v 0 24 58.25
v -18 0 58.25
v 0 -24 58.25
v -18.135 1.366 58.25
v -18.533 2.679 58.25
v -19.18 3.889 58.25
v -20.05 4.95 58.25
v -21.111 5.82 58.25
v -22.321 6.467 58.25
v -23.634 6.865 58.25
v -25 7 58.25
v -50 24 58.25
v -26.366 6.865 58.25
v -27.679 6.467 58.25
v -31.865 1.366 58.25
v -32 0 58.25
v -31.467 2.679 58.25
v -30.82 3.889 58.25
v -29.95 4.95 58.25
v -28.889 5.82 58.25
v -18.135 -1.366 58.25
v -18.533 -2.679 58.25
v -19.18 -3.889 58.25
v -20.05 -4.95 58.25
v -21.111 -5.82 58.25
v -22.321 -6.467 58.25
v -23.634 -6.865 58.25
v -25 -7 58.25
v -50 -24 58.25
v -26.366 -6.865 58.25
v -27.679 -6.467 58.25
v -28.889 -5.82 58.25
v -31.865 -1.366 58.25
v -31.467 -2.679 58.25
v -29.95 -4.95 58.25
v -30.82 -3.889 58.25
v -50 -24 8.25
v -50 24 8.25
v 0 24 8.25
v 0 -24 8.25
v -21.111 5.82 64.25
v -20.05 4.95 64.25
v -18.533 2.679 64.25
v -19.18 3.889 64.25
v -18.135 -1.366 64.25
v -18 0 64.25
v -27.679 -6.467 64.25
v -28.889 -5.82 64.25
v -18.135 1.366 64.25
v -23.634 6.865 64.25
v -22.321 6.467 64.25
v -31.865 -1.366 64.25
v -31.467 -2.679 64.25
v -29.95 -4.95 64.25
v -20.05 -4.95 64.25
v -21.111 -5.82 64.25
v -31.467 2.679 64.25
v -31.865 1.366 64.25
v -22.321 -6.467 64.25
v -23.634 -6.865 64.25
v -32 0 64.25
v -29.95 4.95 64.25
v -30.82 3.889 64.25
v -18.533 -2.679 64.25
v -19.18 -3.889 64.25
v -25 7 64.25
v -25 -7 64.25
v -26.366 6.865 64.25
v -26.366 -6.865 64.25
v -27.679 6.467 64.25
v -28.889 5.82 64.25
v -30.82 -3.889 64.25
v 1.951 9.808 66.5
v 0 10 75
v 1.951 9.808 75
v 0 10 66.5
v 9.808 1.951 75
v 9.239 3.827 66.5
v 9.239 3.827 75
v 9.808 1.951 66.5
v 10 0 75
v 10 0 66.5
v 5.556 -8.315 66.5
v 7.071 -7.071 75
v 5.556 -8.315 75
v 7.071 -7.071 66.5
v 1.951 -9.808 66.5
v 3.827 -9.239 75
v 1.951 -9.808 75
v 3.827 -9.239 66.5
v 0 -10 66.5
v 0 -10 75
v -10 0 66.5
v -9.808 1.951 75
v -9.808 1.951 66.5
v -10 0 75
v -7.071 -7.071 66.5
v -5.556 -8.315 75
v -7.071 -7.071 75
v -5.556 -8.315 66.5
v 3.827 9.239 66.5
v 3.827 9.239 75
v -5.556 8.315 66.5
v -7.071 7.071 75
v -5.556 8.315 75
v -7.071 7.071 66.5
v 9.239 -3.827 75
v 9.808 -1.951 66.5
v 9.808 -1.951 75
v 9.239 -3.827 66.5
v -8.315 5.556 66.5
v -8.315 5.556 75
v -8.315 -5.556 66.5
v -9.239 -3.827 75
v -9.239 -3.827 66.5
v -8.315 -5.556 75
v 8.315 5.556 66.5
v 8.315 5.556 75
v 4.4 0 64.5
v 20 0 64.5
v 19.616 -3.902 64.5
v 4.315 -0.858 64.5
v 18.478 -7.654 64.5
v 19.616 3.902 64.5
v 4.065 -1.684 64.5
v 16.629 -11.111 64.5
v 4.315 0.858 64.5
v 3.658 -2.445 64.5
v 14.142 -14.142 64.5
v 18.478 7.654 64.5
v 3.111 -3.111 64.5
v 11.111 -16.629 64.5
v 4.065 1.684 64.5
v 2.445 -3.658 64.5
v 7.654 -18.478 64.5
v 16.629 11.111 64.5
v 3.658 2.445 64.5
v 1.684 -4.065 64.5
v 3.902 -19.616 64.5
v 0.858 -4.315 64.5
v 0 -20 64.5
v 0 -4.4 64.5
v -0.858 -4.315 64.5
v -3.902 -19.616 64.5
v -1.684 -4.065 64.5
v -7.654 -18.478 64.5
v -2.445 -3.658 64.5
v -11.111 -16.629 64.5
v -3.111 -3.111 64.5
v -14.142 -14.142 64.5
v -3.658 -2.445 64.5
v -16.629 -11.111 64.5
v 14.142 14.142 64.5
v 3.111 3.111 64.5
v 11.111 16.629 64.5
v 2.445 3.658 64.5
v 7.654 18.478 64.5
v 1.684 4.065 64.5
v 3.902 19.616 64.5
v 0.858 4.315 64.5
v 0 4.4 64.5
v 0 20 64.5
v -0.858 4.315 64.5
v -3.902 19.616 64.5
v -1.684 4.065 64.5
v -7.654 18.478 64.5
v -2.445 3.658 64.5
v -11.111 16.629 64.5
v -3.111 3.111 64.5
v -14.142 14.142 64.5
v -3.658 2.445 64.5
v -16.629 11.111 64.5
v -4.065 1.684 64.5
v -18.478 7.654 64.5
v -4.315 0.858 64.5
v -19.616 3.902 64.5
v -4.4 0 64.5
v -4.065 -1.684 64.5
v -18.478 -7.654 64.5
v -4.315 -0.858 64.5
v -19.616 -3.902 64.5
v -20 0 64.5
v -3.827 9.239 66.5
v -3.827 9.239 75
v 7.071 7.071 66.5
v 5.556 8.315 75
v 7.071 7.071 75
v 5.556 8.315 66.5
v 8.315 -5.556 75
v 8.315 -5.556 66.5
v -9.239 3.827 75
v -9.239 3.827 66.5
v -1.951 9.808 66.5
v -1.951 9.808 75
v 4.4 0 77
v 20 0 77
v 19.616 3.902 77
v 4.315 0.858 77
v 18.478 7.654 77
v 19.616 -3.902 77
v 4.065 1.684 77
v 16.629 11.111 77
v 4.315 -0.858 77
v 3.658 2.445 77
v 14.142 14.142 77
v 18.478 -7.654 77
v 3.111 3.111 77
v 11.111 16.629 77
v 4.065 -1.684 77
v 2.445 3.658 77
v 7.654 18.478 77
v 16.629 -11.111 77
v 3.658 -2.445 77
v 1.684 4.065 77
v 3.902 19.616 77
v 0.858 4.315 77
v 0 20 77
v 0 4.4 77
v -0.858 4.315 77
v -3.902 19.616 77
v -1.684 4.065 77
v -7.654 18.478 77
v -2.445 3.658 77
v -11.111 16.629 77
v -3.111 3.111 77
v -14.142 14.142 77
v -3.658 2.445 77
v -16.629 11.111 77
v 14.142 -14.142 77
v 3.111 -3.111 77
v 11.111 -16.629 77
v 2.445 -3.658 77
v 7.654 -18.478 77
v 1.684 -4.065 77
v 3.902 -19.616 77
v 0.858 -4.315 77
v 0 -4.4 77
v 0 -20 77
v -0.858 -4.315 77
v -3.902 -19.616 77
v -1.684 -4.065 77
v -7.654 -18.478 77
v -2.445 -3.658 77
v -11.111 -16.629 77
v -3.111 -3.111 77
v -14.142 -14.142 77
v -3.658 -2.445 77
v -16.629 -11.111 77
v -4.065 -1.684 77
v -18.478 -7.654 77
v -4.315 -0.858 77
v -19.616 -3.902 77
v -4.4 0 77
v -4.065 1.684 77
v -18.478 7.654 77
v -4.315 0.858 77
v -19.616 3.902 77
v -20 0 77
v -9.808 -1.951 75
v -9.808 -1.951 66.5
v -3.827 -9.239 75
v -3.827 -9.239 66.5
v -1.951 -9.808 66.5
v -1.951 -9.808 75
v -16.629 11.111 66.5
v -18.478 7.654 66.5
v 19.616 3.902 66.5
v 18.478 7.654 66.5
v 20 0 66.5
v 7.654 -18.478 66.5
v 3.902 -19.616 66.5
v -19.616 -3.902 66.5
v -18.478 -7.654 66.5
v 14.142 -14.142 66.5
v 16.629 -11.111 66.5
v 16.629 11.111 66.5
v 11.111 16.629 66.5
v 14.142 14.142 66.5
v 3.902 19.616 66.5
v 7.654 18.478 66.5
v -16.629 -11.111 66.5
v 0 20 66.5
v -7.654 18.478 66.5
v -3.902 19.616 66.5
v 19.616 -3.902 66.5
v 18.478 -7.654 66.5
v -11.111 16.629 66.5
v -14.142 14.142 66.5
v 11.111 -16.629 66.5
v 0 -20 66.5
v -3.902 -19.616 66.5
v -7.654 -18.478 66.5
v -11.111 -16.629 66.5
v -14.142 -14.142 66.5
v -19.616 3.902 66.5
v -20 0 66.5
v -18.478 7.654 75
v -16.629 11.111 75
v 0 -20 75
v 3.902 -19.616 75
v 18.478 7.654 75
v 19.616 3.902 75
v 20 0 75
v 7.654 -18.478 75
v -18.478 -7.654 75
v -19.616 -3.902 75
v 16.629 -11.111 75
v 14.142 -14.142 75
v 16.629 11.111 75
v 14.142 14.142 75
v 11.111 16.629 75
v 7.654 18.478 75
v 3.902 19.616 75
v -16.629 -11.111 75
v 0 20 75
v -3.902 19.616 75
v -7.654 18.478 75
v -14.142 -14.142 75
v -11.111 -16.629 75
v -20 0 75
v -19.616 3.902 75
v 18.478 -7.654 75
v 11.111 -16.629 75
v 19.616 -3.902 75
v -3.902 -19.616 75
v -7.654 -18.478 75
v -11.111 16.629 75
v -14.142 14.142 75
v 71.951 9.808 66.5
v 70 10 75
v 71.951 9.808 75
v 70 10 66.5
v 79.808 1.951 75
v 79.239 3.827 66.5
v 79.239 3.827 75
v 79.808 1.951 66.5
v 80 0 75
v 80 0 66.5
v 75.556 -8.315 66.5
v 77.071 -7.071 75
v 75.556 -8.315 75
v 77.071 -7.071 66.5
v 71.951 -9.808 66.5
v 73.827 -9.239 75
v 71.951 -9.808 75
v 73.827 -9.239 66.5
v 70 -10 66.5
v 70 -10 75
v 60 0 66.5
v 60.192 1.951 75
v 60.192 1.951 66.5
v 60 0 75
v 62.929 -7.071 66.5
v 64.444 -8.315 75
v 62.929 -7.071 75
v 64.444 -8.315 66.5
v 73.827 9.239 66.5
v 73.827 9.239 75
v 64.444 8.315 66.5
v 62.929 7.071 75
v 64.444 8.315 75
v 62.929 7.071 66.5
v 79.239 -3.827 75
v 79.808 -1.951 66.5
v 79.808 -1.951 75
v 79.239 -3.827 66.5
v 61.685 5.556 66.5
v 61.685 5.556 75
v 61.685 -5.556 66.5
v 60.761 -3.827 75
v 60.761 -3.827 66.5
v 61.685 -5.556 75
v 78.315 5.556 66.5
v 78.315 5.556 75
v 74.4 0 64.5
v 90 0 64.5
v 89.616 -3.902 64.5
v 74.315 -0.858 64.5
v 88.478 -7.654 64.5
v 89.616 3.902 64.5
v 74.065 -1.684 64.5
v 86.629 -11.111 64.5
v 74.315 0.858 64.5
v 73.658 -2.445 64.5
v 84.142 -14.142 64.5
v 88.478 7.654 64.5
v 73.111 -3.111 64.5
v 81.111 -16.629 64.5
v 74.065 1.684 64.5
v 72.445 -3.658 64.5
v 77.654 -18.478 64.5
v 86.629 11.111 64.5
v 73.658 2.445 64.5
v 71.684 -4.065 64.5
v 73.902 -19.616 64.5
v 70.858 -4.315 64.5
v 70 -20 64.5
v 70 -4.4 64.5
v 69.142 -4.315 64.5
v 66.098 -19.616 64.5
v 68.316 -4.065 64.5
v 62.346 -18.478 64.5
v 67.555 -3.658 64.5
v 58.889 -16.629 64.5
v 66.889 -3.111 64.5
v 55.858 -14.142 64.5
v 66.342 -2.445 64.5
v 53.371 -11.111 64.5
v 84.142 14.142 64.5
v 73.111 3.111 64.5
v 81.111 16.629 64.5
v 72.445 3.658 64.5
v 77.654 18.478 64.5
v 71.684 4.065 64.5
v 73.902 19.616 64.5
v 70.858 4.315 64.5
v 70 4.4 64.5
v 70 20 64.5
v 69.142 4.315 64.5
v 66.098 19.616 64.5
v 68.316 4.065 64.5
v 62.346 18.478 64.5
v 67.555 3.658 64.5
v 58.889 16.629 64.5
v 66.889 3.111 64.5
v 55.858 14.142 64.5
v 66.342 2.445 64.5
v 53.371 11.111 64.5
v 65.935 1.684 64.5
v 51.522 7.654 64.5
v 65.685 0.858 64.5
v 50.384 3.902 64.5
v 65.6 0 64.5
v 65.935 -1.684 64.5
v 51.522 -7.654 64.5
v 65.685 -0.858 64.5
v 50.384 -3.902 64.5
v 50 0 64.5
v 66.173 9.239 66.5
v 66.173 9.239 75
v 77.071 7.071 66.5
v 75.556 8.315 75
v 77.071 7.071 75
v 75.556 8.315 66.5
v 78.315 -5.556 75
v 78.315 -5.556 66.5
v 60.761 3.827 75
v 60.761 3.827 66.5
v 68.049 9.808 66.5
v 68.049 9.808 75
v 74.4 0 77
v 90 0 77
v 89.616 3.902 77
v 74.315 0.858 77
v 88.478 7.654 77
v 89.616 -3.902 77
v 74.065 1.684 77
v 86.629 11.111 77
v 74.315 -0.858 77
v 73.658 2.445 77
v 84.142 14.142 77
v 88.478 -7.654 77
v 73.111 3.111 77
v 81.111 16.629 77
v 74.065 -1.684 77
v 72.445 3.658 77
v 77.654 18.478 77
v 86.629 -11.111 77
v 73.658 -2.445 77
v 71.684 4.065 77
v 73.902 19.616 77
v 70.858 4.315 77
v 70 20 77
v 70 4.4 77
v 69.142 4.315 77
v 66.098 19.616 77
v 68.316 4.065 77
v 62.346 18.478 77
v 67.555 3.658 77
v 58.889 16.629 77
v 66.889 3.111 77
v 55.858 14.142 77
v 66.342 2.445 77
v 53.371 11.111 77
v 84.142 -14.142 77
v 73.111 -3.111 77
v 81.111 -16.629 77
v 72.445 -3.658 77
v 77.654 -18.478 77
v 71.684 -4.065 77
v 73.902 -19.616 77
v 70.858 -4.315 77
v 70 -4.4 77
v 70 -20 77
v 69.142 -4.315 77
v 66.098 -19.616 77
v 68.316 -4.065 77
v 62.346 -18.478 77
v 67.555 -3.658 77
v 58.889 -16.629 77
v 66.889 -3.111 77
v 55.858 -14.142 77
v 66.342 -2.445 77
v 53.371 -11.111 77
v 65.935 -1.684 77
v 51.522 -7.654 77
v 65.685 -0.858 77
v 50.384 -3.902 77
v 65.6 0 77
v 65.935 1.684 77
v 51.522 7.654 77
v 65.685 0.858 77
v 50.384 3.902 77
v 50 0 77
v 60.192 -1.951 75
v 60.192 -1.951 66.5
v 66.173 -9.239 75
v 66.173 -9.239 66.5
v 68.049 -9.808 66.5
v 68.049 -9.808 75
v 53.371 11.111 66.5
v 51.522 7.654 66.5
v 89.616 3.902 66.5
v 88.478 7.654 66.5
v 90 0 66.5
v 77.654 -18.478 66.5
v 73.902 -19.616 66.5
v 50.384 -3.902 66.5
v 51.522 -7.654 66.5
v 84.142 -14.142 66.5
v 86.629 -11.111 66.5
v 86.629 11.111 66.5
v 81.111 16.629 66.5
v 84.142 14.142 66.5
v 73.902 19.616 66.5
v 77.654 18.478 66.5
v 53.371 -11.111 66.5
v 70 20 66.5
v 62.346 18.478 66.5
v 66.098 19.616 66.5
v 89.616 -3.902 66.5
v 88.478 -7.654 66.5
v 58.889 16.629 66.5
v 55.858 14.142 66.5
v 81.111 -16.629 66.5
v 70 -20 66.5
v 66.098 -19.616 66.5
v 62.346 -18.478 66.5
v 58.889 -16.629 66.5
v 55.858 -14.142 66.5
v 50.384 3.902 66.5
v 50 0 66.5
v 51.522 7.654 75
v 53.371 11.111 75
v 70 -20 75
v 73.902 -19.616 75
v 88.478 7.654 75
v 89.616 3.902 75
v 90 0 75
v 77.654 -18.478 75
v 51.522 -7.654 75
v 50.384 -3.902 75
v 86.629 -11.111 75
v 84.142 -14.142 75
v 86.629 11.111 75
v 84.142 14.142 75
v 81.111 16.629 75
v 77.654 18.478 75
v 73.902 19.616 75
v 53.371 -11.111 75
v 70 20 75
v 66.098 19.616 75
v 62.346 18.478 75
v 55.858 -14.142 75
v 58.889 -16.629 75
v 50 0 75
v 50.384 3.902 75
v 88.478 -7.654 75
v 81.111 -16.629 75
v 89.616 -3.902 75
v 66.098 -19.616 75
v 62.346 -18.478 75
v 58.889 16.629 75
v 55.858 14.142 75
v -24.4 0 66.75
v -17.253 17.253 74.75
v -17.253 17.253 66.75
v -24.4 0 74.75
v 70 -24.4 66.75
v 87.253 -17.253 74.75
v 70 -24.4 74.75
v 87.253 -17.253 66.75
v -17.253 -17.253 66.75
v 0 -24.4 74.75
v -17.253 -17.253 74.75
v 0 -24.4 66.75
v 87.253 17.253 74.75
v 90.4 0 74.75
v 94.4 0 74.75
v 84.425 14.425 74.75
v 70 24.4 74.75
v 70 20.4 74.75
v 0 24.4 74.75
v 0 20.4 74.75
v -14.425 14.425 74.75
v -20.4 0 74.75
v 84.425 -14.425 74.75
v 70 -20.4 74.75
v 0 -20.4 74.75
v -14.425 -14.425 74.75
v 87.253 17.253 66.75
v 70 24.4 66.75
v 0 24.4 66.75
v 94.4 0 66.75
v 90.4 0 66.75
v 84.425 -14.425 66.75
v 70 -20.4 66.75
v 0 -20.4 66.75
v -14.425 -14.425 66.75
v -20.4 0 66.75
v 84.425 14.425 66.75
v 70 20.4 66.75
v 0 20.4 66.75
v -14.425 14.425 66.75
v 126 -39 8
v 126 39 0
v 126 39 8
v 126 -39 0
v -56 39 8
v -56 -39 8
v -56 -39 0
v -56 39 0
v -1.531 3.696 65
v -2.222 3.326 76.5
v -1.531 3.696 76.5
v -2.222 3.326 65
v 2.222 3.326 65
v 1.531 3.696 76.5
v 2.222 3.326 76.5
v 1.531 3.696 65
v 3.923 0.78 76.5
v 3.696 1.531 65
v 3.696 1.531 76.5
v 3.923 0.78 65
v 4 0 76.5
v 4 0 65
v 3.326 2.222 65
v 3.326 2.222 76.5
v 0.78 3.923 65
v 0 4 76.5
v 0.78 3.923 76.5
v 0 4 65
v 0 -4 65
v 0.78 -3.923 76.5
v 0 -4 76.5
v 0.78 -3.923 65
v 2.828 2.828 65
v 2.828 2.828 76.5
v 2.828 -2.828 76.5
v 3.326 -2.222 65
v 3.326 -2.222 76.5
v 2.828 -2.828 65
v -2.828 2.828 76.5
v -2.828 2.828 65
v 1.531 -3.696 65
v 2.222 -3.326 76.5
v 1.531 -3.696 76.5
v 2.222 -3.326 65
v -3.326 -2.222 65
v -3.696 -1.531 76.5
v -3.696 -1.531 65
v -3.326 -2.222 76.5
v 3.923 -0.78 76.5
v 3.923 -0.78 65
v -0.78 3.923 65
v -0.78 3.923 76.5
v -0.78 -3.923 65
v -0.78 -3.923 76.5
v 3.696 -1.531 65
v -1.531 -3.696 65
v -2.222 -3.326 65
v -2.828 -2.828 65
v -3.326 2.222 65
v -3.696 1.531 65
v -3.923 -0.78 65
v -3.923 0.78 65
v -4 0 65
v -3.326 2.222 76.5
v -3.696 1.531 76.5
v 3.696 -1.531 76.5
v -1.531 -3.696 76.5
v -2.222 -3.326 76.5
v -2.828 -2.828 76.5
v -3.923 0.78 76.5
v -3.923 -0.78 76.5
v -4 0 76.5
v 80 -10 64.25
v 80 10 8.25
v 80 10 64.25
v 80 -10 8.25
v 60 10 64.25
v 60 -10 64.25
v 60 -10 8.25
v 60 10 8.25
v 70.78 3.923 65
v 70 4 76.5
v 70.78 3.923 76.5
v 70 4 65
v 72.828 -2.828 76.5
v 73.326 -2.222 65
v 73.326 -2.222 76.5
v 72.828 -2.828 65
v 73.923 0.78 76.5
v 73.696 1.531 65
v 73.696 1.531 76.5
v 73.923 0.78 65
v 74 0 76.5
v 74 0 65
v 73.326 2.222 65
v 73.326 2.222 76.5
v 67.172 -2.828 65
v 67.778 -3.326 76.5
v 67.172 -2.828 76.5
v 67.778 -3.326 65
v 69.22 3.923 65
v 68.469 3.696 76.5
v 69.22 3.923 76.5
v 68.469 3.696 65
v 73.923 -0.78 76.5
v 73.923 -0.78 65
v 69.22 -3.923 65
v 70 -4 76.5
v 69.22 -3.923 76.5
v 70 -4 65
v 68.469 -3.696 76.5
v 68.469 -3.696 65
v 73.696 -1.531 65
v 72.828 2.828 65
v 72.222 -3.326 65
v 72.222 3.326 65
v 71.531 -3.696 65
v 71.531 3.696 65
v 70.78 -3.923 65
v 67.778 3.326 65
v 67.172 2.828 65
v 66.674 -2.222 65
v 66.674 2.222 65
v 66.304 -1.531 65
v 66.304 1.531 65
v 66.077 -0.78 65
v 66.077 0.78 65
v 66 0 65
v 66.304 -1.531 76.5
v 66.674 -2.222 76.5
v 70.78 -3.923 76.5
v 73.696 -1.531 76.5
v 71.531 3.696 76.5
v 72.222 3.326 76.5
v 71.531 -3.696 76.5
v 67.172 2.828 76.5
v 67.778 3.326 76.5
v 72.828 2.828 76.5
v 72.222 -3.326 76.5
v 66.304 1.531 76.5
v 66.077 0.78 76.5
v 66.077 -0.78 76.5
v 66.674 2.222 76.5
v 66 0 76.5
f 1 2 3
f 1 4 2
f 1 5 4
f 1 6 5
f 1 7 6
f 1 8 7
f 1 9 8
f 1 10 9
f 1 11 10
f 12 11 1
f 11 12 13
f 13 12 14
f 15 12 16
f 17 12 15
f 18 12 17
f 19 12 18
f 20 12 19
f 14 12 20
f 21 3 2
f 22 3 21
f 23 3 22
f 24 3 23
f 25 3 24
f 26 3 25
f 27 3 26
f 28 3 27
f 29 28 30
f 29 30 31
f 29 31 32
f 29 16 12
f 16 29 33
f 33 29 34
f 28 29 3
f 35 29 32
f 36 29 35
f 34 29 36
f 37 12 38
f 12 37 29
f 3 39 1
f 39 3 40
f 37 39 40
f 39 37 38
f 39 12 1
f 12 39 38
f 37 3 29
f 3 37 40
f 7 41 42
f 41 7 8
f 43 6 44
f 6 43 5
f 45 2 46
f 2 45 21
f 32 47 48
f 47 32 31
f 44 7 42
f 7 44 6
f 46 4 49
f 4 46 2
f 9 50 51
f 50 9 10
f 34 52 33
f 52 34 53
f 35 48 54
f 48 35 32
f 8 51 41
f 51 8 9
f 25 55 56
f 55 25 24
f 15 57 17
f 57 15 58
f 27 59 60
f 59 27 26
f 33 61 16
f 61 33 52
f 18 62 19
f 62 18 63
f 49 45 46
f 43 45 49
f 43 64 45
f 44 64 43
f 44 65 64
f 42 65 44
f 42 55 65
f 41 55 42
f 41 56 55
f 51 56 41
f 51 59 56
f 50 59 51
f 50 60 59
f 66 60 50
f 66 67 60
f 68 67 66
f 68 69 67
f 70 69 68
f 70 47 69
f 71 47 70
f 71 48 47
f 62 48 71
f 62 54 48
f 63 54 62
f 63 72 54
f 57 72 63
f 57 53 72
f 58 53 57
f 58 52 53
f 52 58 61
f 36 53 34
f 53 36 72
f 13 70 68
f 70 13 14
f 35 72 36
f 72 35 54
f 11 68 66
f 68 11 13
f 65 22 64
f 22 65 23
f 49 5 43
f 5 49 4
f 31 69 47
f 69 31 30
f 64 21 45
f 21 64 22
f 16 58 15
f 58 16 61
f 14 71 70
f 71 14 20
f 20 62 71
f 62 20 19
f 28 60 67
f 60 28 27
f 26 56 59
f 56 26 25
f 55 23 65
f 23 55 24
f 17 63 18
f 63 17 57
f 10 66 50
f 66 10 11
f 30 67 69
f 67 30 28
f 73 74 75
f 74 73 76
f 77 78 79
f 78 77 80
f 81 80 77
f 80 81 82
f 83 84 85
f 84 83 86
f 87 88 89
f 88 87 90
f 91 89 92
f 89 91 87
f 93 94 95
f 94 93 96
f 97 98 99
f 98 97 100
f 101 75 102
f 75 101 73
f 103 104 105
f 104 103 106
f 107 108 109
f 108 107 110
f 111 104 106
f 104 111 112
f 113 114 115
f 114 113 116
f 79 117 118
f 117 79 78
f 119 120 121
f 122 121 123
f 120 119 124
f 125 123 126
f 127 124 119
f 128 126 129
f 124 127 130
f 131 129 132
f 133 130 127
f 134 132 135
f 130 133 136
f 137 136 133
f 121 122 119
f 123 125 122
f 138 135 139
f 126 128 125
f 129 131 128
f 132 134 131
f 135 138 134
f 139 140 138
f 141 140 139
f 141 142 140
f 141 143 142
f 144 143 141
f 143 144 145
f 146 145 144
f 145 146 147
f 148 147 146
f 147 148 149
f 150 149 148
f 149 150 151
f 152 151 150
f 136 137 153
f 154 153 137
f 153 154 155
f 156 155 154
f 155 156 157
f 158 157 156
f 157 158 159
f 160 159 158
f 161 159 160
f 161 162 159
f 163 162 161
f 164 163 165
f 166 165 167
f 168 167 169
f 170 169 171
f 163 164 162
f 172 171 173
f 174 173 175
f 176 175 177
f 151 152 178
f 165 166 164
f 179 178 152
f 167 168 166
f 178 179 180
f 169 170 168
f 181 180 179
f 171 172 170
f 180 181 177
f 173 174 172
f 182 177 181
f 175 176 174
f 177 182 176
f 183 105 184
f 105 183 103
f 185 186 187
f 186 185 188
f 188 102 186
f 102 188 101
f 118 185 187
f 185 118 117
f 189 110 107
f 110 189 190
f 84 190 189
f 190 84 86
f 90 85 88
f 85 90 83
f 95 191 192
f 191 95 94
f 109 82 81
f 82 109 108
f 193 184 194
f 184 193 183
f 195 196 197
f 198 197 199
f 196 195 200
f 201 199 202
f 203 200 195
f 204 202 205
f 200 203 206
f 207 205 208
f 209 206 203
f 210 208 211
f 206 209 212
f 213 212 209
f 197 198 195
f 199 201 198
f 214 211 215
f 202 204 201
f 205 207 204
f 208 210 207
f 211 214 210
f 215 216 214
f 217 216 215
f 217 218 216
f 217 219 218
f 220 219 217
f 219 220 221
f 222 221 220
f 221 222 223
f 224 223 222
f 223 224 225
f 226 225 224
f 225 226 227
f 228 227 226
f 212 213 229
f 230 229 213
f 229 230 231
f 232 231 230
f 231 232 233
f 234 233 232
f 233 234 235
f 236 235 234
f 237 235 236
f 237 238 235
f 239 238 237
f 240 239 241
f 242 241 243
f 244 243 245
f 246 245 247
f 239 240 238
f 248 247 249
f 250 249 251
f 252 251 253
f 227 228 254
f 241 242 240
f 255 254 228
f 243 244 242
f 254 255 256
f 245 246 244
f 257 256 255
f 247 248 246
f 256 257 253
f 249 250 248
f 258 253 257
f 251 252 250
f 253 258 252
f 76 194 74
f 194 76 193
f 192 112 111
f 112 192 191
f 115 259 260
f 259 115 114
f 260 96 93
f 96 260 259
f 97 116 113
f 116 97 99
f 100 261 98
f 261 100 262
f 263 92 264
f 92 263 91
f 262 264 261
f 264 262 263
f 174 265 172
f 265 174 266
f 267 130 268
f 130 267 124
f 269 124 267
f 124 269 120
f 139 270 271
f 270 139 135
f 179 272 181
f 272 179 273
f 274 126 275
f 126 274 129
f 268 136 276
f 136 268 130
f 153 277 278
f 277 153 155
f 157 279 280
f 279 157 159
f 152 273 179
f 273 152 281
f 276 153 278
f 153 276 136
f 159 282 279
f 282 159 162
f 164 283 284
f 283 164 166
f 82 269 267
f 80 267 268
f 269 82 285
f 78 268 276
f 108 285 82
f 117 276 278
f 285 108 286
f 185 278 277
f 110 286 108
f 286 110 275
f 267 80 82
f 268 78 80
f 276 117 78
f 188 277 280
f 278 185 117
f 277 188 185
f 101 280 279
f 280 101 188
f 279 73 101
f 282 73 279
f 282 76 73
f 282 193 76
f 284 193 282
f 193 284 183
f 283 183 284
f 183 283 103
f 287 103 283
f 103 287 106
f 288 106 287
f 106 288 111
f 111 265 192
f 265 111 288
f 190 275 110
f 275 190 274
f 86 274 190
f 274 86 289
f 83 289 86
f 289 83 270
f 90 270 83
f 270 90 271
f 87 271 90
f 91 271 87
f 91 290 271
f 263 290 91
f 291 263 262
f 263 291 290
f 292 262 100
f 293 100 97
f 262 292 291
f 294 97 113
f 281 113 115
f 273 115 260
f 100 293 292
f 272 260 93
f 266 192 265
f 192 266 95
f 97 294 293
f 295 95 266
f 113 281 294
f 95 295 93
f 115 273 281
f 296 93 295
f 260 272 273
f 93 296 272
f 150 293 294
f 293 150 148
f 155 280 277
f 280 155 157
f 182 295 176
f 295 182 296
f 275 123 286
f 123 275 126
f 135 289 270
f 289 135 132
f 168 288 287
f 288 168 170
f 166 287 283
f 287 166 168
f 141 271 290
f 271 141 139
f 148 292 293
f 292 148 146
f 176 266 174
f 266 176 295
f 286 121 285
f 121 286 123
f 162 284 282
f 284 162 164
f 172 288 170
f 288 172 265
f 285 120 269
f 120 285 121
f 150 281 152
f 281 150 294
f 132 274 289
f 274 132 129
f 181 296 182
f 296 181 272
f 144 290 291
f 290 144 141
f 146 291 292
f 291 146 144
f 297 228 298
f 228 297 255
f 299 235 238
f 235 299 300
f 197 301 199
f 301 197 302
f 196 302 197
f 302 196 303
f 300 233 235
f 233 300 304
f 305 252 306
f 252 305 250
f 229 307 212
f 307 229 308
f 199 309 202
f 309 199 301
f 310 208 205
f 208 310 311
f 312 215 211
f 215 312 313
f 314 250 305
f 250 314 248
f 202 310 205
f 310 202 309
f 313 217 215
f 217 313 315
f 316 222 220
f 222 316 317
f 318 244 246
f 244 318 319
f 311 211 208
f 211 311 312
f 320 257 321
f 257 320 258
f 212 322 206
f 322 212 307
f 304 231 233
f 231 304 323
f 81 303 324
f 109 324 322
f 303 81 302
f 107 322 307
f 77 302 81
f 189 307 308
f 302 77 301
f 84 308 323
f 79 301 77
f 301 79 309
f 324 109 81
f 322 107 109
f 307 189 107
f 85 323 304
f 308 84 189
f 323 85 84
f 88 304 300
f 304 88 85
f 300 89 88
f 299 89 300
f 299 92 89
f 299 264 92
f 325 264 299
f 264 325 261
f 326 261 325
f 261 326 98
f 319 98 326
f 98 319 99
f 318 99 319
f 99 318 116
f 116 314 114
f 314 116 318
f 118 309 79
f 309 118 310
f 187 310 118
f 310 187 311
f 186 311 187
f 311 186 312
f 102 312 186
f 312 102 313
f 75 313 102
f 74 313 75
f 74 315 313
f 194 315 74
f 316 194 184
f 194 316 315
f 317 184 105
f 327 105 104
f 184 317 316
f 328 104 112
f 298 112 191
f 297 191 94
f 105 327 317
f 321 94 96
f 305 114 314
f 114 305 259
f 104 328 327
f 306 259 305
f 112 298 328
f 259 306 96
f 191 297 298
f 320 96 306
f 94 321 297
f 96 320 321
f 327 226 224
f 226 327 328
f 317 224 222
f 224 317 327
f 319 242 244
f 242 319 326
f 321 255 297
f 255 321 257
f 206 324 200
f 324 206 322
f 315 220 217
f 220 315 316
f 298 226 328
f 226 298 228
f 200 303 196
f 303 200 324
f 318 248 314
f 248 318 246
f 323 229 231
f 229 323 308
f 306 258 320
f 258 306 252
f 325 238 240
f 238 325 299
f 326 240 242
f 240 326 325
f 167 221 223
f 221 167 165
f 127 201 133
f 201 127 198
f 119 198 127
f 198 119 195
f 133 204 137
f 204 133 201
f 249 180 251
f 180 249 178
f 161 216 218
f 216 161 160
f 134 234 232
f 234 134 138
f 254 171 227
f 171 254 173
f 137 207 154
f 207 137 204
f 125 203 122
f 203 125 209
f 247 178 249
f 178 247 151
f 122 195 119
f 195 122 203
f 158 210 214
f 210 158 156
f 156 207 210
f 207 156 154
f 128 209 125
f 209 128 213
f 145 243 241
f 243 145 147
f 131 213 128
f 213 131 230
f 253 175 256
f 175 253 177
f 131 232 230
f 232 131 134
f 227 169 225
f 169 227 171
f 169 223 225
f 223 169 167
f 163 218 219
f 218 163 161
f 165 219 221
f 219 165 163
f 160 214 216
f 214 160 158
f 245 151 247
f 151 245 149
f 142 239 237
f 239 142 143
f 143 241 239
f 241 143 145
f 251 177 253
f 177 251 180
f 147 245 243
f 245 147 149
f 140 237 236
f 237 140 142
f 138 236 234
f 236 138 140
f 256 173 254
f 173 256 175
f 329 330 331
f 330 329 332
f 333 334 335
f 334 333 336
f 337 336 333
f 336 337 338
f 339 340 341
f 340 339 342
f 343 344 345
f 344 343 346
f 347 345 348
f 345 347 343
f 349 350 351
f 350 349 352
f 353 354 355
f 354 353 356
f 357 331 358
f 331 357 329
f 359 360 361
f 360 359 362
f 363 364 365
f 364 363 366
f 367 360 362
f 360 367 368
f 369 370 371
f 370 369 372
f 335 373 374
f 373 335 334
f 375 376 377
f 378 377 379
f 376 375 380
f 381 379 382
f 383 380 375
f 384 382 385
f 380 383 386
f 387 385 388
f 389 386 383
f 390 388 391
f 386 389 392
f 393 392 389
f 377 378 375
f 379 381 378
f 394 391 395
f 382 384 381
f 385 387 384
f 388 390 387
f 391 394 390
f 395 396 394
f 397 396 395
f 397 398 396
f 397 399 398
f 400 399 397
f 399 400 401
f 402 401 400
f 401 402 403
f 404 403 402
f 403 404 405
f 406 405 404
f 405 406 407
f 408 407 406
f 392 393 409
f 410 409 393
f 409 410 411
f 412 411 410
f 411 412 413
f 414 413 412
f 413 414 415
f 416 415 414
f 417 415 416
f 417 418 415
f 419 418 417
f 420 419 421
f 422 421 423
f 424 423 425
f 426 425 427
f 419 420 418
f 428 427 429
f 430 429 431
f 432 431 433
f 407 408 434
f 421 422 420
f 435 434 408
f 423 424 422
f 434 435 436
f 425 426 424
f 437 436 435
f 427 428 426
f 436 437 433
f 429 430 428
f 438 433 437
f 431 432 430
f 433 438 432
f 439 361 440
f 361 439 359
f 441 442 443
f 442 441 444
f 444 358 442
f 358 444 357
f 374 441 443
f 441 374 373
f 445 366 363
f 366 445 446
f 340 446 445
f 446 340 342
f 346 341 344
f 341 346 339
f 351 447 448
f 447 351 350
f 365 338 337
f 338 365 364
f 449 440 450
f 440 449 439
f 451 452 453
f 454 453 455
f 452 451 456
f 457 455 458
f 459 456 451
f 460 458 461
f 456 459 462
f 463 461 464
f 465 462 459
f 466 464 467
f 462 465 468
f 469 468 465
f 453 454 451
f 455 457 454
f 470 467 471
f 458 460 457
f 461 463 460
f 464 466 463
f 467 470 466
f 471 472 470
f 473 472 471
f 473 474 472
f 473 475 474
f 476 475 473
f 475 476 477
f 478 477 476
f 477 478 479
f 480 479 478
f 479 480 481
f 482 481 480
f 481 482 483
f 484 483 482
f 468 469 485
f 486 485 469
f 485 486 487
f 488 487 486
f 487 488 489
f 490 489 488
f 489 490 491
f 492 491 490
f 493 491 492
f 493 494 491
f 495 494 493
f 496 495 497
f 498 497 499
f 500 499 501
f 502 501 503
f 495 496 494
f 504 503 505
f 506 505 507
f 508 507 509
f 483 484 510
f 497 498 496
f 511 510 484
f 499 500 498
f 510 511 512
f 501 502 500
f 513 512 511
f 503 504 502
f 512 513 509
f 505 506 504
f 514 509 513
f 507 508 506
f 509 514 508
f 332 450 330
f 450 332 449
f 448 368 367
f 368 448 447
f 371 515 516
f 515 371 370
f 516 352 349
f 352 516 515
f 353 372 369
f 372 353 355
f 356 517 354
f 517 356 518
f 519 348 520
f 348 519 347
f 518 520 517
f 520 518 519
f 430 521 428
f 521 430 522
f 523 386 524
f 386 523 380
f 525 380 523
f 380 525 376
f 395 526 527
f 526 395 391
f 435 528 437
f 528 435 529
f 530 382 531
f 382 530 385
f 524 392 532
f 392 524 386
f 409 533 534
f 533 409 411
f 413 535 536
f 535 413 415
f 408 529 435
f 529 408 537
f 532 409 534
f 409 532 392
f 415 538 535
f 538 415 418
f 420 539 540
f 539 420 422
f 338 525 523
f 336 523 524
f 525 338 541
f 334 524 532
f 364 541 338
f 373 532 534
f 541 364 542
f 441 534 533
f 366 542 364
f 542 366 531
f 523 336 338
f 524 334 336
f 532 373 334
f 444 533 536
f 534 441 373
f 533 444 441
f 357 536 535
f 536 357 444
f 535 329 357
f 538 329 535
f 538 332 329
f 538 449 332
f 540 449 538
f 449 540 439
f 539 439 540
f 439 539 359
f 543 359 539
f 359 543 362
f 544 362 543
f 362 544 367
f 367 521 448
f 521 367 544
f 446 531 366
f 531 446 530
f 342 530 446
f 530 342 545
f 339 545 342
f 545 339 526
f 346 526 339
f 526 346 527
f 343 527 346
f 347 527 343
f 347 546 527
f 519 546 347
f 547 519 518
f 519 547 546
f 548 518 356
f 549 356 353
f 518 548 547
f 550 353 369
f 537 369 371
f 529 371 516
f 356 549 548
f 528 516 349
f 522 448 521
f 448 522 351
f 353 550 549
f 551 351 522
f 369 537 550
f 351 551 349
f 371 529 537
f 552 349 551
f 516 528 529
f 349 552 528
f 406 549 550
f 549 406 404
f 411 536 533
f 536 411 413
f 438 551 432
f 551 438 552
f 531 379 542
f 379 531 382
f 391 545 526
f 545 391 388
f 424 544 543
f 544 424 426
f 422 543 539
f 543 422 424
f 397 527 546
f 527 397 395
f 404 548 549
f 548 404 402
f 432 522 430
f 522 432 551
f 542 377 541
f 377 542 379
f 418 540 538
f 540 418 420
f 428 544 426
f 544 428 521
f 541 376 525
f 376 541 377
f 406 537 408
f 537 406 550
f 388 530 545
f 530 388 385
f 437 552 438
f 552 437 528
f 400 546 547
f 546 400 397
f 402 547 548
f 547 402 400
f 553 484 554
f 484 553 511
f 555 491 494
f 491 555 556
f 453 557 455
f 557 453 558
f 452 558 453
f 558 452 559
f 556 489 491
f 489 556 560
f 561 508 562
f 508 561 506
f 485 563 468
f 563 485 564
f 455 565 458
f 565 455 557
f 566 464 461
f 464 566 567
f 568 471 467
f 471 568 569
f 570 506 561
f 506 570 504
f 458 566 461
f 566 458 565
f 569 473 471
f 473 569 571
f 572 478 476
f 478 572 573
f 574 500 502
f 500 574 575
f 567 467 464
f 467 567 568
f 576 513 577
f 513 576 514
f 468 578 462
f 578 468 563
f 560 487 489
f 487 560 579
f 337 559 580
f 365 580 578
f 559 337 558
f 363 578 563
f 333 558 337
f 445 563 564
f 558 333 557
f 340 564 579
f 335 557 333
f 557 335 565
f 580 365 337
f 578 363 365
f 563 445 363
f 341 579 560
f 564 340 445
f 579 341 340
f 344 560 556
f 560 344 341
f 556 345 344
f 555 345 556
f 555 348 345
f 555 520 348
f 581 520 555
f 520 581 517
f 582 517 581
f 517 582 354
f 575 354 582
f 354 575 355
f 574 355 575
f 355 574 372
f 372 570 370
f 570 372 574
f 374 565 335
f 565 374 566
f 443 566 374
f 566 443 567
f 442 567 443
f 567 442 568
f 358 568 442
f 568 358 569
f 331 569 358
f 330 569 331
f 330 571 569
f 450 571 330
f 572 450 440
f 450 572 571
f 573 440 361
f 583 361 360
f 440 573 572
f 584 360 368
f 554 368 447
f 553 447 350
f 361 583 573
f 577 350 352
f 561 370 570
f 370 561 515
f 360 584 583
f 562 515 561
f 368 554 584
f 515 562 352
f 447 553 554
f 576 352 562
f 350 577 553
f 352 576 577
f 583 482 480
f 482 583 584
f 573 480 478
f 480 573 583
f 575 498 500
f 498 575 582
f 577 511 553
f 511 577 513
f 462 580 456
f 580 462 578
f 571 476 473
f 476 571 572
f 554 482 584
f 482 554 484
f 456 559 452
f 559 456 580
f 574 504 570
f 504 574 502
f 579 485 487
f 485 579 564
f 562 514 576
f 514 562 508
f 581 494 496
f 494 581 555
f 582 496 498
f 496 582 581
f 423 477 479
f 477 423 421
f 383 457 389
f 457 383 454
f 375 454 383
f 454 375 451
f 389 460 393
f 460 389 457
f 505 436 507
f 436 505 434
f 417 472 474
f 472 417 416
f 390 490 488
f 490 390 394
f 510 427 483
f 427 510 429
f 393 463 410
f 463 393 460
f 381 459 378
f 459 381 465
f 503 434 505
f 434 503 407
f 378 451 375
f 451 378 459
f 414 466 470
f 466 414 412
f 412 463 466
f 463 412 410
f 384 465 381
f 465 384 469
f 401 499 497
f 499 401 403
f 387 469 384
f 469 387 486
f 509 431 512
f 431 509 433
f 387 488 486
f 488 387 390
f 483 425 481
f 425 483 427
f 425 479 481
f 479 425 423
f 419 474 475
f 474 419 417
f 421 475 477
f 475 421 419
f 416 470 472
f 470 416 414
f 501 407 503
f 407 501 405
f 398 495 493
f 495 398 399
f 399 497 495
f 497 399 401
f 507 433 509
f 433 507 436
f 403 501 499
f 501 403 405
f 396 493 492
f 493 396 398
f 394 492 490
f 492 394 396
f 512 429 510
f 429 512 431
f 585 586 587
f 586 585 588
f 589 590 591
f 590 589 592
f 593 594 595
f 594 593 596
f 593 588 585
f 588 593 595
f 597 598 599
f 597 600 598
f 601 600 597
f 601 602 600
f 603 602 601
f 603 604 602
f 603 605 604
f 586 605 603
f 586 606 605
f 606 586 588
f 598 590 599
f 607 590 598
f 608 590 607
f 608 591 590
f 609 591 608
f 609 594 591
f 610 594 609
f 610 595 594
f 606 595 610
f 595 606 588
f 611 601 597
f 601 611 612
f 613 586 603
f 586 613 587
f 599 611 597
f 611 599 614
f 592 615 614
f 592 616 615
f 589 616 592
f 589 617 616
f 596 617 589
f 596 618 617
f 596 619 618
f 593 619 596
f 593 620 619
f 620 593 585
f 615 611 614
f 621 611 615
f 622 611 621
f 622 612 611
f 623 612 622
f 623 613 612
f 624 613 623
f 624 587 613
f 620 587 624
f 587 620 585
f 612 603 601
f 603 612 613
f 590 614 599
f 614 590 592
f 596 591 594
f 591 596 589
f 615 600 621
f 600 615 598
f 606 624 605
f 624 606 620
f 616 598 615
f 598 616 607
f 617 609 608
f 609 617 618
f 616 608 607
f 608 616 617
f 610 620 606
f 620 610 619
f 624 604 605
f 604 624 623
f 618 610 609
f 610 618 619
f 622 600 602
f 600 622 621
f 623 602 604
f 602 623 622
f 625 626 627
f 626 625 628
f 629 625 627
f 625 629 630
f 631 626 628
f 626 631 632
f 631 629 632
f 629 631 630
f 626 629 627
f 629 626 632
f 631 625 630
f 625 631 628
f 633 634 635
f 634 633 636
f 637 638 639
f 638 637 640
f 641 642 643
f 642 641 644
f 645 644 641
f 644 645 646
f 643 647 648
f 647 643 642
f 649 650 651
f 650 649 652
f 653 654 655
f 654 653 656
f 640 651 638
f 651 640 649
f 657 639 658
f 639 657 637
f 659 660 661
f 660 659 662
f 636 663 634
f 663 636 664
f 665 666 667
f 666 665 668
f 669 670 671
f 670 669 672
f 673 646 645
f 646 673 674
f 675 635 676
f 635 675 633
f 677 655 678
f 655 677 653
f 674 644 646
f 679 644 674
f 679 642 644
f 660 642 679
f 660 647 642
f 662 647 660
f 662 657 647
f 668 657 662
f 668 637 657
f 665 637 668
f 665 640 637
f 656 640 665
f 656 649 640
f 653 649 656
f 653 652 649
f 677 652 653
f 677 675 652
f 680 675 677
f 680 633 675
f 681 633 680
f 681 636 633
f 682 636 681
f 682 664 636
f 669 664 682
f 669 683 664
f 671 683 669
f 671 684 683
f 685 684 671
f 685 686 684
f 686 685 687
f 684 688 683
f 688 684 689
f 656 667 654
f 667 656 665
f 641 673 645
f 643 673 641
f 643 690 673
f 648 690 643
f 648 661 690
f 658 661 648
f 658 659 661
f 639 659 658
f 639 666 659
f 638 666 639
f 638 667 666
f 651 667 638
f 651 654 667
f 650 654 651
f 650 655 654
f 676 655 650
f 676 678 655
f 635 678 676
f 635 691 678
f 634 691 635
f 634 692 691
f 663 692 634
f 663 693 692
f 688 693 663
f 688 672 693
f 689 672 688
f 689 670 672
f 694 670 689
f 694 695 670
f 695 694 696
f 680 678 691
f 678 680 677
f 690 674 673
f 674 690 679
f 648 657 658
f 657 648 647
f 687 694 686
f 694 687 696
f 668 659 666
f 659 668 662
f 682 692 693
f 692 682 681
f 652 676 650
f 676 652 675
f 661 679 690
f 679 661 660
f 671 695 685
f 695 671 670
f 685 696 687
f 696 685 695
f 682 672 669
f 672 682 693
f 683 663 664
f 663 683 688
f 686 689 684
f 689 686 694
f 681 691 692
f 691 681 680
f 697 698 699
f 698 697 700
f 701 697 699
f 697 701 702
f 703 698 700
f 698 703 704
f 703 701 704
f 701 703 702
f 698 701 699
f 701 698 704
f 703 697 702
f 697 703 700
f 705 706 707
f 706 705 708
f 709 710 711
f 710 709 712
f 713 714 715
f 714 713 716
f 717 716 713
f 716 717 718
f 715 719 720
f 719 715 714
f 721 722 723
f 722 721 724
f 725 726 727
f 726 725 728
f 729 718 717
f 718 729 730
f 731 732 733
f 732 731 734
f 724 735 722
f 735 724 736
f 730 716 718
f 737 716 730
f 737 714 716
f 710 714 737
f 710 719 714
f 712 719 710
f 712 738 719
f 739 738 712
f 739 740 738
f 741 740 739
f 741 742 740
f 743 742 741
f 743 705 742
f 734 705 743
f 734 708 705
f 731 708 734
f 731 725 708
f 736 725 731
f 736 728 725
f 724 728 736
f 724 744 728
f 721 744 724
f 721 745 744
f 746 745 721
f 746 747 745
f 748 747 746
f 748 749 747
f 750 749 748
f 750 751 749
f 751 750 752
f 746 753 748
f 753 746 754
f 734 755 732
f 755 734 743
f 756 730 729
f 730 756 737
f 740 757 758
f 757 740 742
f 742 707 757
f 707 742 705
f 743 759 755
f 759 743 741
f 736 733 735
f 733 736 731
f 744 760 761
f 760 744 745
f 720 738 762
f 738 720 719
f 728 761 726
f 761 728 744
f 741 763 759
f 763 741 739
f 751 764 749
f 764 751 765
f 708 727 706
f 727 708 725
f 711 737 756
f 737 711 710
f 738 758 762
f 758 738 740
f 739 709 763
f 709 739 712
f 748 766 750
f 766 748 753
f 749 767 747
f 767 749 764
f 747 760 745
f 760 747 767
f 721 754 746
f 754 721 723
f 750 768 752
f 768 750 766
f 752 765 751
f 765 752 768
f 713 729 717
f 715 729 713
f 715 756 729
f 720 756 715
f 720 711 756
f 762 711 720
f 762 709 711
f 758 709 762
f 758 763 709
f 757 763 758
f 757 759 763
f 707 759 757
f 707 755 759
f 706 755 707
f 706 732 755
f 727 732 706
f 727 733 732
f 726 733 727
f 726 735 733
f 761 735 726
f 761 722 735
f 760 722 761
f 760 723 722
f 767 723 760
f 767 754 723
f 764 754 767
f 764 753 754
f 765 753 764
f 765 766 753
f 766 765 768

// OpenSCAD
$fn = 32;

// ------------------------------------------------------------------------
// Motor belt drive: span 70 mm, pulleys d40, belt 8 mm wide
// Every part is its own module, assembly() places every instance.
// ------------------------------------------------------------------------

// --- part 1 ---
module base_plate() {
  difference() {
    translate([-91, -39, 0]) cube([182, 78, 8]);
  }
}

// --- part 2 ---
module motor() {
  union() {
    translate([-25, -24, 0]) cube([50, 48, 50]);
    translate([28, 0, 25]) rotate([0, 90, 0]) cylinder(h = 6, d = 14, center = true);
  }
}

// --- part 3 ---
module drive_shaft() {
  translate([0, 0, -5.75]) cylinder(h = 11.5, d = 8);
}

// --- part 4 ---
module pulley_drive() {
  difference() {
    union() {
      cylinder(h = 12.5, d = 20);
      cylinder(h = 2, d = 40);
      translate([0, 0, 10.5]) cylinder(h = 2, d = 40);
    }
    translate([0, 0, -1]) cylinder(h = 14.5, d = 8.8);
  }
}

// --- part 5 ---
module idler_post() {
  translate([-10, -10, 0]) cube([20, 20, 56]);
}

// --- part 6 ---
module driven_shaft() {
  translate([0, 0, -5.75]) cylinder(h = 11.5, d = 8);
}

// --- part 7 ---
module pulley_driven() {
  difference() {
    union() {
      cylinder(h = 12.5, d = 20);
      cylinder(h = 2, d = 40);
      translate([0, 0, 10.5]) cylinder(h = 2, d = 40);
    }
    translate([0, 0, -1]) cylinder(h = 14.5, d = 8.8);
  }
}

// --- part 8 ---
module drive_belt() {
  difference() {
    linear_extrude(height = 8) polygon(points = concat([for (a = [90 : 45 : 270]) [24.4 * cos(a), 24.4 * sin(a)]], [for (a = [270 : 45 : 450]) [70 + 24.4 * cos(a), 24.4 * sin(a)]]));
    translate([0, 0, -1]) linear_extrude(height = 10) polygon(points = concat([for (a = [90 : 45 : 270]) [20.4 * cos(a), 20.4 * sin(a)]], [for (a = [270 : 45 : 450]) [70 + 20.4 * cos(a), 20.4 * sin(a)]]));
  }
}

// --- assembly ---
module assembly() {
  color([0.80, 0.24, 0.20]) translate([35, 0, 0]) rotate([0, 0, 0]) base_plate();
  color([0.20, 0.45, 0.75]) translate([0, 0, 33.25]) rotate([0, 270, 0]) motor();
  color([0.25, 0.62, 0.32]) translate([0, 0, 70.75]) rotate([0, 0, 0]) drive_shaft();
  color([0.92, 0.70, 0.18]) translate([0, 0, 64.5]) rotate([0, 0, 0]) pulley_drive();
  color([0.58, 0.35, 0.70]) translate([70, 0, 8.25]) rotate([0, 0, 0]) idler_post();
  color([0.16, 0.66, 0.66]) translate([70, 0, 70.75]) rotate([0, 0, 0]) driven_shaft();
  color([0.85, 0.48, 0.18]) translate([70, 0, 64.5]) rotate([0, 0, 0]) pulley_driven();
  color([0.55, 0.60, 0.65]) translate([0, 0, 66.75]) rotate([0, 0, 0]) drive_belt();
}

assembly();
